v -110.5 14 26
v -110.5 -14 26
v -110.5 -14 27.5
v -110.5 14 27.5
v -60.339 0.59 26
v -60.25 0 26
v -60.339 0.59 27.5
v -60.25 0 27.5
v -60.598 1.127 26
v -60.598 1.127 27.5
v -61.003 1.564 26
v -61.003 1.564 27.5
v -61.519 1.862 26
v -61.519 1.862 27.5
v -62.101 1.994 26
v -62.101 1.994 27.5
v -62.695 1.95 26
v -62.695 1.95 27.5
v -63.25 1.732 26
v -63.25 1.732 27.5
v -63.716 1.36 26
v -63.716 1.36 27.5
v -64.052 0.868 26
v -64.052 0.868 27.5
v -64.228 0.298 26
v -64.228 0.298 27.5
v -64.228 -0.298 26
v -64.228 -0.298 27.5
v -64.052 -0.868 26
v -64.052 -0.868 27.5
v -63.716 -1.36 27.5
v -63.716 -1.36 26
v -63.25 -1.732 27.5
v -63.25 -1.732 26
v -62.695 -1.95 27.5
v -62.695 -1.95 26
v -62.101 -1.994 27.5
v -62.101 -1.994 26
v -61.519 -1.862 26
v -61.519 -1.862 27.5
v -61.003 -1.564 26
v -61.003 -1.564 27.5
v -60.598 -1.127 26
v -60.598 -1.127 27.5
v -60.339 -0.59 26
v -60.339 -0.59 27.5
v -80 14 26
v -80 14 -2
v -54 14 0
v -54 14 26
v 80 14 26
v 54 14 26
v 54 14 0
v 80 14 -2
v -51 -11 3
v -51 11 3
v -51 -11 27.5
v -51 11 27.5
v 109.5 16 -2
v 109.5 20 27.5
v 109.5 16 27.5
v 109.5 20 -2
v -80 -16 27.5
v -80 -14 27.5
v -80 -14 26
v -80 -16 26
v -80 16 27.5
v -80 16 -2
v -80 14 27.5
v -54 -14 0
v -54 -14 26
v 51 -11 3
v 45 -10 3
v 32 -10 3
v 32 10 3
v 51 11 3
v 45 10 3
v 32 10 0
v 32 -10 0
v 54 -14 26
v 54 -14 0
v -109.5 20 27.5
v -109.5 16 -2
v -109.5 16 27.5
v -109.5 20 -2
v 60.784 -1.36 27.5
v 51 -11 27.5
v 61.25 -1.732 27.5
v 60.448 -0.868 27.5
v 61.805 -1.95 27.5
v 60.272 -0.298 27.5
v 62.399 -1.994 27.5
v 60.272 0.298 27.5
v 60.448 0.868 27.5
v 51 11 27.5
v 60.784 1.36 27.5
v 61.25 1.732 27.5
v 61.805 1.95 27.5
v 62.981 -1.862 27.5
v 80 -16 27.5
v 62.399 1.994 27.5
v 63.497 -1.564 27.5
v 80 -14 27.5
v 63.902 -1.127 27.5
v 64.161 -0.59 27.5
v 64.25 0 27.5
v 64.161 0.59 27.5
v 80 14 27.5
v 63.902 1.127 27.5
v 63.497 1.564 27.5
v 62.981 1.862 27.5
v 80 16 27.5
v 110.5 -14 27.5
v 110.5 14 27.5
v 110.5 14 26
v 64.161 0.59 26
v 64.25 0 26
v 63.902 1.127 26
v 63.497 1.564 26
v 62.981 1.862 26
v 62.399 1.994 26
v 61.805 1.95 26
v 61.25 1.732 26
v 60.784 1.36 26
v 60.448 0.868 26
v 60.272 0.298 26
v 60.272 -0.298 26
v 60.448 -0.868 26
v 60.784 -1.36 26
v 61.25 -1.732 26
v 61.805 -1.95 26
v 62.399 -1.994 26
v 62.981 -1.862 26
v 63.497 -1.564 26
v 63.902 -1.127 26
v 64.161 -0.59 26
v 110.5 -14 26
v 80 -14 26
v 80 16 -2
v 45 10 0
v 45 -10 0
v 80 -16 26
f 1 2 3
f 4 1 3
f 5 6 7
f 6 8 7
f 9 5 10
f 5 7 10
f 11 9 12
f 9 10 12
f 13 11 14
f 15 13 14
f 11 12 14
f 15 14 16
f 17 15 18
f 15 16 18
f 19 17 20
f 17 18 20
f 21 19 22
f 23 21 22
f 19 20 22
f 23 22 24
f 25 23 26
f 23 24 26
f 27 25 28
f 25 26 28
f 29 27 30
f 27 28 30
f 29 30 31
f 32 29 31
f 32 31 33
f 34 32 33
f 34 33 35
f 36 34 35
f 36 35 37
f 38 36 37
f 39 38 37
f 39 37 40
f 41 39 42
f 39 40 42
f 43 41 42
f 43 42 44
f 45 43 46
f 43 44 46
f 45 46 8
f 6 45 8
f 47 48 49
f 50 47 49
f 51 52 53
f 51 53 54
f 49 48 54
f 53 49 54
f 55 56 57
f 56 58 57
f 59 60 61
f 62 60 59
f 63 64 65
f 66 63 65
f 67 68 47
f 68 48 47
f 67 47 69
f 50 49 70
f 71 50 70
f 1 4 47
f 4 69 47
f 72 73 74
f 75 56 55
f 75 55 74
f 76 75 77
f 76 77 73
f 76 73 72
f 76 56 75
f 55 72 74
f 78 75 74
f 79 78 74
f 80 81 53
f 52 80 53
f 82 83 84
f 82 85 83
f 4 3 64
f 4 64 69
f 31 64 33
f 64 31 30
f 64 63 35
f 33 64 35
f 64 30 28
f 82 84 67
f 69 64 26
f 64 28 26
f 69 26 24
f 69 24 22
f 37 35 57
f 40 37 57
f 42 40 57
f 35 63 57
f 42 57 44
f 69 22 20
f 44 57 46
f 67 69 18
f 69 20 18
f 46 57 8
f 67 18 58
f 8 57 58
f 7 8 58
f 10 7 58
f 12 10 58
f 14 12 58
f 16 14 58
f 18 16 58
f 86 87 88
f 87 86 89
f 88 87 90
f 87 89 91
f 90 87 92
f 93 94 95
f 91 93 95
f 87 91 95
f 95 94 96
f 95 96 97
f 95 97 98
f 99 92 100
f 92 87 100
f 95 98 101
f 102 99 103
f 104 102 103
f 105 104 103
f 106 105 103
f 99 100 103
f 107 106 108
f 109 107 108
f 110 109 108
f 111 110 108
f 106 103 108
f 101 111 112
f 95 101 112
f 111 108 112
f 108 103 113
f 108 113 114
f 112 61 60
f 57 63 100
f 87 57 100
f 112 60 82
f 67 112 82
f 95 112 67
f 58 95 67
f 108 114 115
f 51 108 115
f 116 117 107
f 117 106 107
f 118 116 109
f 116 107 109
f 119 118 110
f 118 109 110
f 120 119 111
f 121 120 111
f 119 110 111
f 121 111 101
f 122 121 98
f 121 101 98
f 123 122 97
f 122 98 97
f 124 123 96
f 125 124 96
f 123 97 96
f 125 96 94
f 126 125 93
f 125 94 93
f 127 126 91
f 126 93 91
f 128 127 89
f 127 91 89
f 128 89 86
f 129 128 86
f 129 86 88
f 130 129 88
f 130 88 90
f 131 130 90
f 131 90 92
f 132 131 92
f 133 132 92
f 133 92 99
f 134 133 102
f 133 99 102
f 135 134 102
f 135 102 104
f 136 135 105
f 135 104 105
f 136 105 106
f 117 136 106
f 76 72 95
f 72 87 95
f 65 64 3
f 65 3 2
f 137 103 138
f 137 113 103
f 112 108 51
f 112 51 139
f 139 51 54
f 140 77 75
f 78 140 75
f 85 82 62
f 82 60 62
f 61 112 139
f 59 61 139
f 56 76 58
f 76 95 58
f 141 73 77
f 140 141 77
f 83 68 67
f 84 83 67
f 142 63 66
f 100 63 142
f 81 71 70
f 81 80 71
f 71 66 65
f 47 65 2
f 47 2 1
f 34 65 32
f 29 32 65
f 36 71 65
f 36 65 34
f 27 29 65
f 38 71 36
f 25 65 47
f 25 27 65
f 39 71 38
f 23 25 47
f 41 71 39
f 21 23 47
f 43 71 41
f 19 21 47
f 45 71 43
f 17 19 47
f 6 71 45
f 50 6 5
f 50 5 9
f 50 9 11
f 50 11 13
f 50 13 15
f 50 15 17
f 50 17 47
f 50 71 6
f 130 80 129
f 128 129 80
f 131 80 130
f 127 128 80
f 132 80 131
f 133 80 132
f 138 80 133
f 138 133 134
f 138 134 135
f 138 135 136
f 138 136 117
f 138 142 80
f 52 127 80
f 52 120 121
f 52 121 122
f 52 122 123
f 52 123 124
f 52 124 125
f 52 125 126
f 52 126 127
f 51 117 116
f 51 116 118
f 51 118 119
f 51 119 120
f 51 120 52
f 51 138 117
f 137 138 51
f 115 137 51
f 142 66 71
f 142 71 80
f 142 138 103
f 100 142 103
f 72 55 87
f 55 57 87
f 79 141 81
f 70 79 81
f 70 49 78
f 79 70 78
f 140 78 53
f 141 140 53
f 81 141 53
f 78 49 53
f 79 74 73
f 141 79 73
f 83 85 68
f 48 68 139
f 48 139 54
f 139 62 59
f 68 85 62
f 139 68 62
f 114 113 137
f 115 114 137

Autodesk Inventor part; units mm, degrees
ref_plane "YZ Plane" through (0, 0, 0) normal (1, 0, 0) x (0, 1, 0)
ref_plane "XZ Plane" through (0, 0, 0) normal (0, 1, 0) x (-1, 0, 0)
ref_plane "XY Plane" through (0, 0, 0) normal (0, 0, 1) x (1, 0, 0)
sketch "Эскиз1" plane through (0, 0, 0) normal (0, 0, 1) x (1, 0, 0)
  line L0 (-54, -14) -> (54, -14)
  line L1 (54, -14) -> (54, 14)
  line L2 (54, 14) -> (-54, 14)
  line L3 (-54, 14) -> (-54, -14)
  line L4 (-54, -14) -> (54, 14) construction
  line L5 (54, -14) -> (-54, 14) construction
  point P0 (0, 0)
  dimension "d0" = 108
  dimension "d1" = 28
extrude "Выдавливание1" add sketch "Эскиз1" along normal blind 27.5
sketch "Эскиз2" plane through (0, 0, 27.5) normal (0, 0, 1) x (1, 0, 0)
  line L0 (-51, -11) -> (51, -11)
  line L1 (51, -11) -> (51, 11)
  line L2 (51, 11) -> (-51, 11)
  line L3 (-51, 11) -> (-51, -11)
  line L4 (-51, -11) -> (51, 11) construction
  line L5 (51, -11) -> (-51, 11) construction
  line L6 (54, 14) -> (-54, 14) projected
  line L7 (54, -14) -> (54, 14) projected
  point P0 (0, 0)
  dimension "d4" = 3
  dimension "d5" = 3
extrude "Выдавливание2" cut sketch "Эскиз2" against normal blind 24.5
sketch "Эскиз3" plane through (54, -14, 0) normal (1, 0, 0) x (0, 0, -1)
  line L0 (0, 28) -> (-27.5, 28) projected
  line L1 (0, 0) -> (-27.5, 0) projected
  line L2 (-27.5, 28) -> (-26, 28)
  line L3 (-26, 28) -> (-26, 0)
  line L4 (-26, 0) -> (-27.5, 0)
  line L5 (-27.5, 0) -> (-27.5, 28)
  point P0 (0, 14)
  dimension "d8" = 1.5
extrude "Выдавливание3" add sketch "Эскиз3" along normal blind 50
mirror "Зеркальное отражение1" about plane through (0, 0, 0) normal (1, 0, 0) of "Выдавливание3"
move faces "Перенос1" translate (6.5, 0, 0) faces at (104, 4.6667, 27)
move faces "Перенос2" translate (-6.5, 0, 0) faces at (-104, 4.6667, 27)
sketch "Эскиз7" plane through (-54, -14, 0) normal (0, -1, 0) x (1, 0, 0)
  line L0 (-56.5, 27.5) -> (164.5, 27.5) projected
  line L1 (0, 26) -> (-56.5, 26) projected
  line L2 (134, 27.5) -> (-26, 27.5)
  line L3 (-26, 27.5) -> (-26, 26)
  line L4 (-26, 26) -> (134, 26)
  line L5 (134, 26) -> (134, 27.5)
  line L6 (0, 0) -> (108, 0) projected
  point P0 (54, 0)
  point P1 (-26, 26.75)
  point P2 (54, 0)
  dimension "d29" = 160
  dimension "d30" = 80
extrude "Выдавливание7" add sketch "Эскиз7" along normal blind 2
sketch "Эскиз8" plane through (-54, 14, 0) normal (0, 1, 0) x (1, 0, 0)
  line L0 (-56.5, -27.5) -> (164.5, -27.5) projected
  line L1 (-26, -27.5) -> (134, -27.5)
  line L2 (134, -27.5) -> (134, 2)
  line L3 (134, 2) -> (-26, 2)
  line L4 (-26, 2) -> (-26, -27.5)
  line L5 (108, 0) -> (0, 0) projected
  point P0 (54, 0)
  point P1 (54, 0)
  dimension "d33" = 160
  dimension "d34" = 80
  dimension "d35" = 29.5
extrude "Выдавливание8" add sketch "Эскиз8" along normal blind 6
sketch "Эскиз9" plane through (80, 14, 26) normal (1, 0, 0) x (0, 0, -1)
  line L0 (28, 0) -> (28, 6) projected
  line L1 (28, 6) -> (-1.5, 6)
  line L2 (-1.5, 6) -> (-1.5, 2)
  line L3 (-1.5, 2) -> (28, 2)
  line L4 (28, 2) -> (28, 6)
  point P0 (26, -14)
  dimension "d38" = 4
extrude "Выдавливание9" add sketch "Эскиз9" along normal blind 29.5
mirror "Зеркальное отражение3" about plane through (0, 0, 0) normal (1, 0, 0) of "Выдавливание9"
sketch "Эскиз10" plane through (0, 0, 27.5) normal (0, 0, 1) x (1, 0, 0)
  circle A0 centre (-62.25, 0) radius 2 projected
  circle A1 centre (62.25, 0) radius 2 projected
  point P0 (0, 0)
extrude "Выдавливание10" cut sketch "Эскиз10" against normal through all
sketch "Эскиз11" plane through (0, 0, 3) normal (0, 0, 1) x (1, 0, 0)
  line L0 (32, -10) -> (45, -10)
  line L1 (45, -10) -> (45, 10)
  line L2 (45, 10) -> (32, 10)
  line L3 (32, 10) -> (32, -10)
  line L4 (32, -10) -> (45, 10) construction
  line L5 (45, -10) -> (32, 10) construction
  line L6 (51, 11) -> (51, -11) projected
  point P0 (0, 0)
  point P1 (38.5, 0)
  dimension "d43" = 13
  dimension "d44" = 20
  dimension "d45" = 6
extrude "Выдавливание11" cut sketch "Эскиз11" against normal through all
equation "\"d30\" = 0.5 * d29"
equation "\"d34\" = 0.5 * d33"
properties part number "000.009 - Короб" material "Пластик АБС"
